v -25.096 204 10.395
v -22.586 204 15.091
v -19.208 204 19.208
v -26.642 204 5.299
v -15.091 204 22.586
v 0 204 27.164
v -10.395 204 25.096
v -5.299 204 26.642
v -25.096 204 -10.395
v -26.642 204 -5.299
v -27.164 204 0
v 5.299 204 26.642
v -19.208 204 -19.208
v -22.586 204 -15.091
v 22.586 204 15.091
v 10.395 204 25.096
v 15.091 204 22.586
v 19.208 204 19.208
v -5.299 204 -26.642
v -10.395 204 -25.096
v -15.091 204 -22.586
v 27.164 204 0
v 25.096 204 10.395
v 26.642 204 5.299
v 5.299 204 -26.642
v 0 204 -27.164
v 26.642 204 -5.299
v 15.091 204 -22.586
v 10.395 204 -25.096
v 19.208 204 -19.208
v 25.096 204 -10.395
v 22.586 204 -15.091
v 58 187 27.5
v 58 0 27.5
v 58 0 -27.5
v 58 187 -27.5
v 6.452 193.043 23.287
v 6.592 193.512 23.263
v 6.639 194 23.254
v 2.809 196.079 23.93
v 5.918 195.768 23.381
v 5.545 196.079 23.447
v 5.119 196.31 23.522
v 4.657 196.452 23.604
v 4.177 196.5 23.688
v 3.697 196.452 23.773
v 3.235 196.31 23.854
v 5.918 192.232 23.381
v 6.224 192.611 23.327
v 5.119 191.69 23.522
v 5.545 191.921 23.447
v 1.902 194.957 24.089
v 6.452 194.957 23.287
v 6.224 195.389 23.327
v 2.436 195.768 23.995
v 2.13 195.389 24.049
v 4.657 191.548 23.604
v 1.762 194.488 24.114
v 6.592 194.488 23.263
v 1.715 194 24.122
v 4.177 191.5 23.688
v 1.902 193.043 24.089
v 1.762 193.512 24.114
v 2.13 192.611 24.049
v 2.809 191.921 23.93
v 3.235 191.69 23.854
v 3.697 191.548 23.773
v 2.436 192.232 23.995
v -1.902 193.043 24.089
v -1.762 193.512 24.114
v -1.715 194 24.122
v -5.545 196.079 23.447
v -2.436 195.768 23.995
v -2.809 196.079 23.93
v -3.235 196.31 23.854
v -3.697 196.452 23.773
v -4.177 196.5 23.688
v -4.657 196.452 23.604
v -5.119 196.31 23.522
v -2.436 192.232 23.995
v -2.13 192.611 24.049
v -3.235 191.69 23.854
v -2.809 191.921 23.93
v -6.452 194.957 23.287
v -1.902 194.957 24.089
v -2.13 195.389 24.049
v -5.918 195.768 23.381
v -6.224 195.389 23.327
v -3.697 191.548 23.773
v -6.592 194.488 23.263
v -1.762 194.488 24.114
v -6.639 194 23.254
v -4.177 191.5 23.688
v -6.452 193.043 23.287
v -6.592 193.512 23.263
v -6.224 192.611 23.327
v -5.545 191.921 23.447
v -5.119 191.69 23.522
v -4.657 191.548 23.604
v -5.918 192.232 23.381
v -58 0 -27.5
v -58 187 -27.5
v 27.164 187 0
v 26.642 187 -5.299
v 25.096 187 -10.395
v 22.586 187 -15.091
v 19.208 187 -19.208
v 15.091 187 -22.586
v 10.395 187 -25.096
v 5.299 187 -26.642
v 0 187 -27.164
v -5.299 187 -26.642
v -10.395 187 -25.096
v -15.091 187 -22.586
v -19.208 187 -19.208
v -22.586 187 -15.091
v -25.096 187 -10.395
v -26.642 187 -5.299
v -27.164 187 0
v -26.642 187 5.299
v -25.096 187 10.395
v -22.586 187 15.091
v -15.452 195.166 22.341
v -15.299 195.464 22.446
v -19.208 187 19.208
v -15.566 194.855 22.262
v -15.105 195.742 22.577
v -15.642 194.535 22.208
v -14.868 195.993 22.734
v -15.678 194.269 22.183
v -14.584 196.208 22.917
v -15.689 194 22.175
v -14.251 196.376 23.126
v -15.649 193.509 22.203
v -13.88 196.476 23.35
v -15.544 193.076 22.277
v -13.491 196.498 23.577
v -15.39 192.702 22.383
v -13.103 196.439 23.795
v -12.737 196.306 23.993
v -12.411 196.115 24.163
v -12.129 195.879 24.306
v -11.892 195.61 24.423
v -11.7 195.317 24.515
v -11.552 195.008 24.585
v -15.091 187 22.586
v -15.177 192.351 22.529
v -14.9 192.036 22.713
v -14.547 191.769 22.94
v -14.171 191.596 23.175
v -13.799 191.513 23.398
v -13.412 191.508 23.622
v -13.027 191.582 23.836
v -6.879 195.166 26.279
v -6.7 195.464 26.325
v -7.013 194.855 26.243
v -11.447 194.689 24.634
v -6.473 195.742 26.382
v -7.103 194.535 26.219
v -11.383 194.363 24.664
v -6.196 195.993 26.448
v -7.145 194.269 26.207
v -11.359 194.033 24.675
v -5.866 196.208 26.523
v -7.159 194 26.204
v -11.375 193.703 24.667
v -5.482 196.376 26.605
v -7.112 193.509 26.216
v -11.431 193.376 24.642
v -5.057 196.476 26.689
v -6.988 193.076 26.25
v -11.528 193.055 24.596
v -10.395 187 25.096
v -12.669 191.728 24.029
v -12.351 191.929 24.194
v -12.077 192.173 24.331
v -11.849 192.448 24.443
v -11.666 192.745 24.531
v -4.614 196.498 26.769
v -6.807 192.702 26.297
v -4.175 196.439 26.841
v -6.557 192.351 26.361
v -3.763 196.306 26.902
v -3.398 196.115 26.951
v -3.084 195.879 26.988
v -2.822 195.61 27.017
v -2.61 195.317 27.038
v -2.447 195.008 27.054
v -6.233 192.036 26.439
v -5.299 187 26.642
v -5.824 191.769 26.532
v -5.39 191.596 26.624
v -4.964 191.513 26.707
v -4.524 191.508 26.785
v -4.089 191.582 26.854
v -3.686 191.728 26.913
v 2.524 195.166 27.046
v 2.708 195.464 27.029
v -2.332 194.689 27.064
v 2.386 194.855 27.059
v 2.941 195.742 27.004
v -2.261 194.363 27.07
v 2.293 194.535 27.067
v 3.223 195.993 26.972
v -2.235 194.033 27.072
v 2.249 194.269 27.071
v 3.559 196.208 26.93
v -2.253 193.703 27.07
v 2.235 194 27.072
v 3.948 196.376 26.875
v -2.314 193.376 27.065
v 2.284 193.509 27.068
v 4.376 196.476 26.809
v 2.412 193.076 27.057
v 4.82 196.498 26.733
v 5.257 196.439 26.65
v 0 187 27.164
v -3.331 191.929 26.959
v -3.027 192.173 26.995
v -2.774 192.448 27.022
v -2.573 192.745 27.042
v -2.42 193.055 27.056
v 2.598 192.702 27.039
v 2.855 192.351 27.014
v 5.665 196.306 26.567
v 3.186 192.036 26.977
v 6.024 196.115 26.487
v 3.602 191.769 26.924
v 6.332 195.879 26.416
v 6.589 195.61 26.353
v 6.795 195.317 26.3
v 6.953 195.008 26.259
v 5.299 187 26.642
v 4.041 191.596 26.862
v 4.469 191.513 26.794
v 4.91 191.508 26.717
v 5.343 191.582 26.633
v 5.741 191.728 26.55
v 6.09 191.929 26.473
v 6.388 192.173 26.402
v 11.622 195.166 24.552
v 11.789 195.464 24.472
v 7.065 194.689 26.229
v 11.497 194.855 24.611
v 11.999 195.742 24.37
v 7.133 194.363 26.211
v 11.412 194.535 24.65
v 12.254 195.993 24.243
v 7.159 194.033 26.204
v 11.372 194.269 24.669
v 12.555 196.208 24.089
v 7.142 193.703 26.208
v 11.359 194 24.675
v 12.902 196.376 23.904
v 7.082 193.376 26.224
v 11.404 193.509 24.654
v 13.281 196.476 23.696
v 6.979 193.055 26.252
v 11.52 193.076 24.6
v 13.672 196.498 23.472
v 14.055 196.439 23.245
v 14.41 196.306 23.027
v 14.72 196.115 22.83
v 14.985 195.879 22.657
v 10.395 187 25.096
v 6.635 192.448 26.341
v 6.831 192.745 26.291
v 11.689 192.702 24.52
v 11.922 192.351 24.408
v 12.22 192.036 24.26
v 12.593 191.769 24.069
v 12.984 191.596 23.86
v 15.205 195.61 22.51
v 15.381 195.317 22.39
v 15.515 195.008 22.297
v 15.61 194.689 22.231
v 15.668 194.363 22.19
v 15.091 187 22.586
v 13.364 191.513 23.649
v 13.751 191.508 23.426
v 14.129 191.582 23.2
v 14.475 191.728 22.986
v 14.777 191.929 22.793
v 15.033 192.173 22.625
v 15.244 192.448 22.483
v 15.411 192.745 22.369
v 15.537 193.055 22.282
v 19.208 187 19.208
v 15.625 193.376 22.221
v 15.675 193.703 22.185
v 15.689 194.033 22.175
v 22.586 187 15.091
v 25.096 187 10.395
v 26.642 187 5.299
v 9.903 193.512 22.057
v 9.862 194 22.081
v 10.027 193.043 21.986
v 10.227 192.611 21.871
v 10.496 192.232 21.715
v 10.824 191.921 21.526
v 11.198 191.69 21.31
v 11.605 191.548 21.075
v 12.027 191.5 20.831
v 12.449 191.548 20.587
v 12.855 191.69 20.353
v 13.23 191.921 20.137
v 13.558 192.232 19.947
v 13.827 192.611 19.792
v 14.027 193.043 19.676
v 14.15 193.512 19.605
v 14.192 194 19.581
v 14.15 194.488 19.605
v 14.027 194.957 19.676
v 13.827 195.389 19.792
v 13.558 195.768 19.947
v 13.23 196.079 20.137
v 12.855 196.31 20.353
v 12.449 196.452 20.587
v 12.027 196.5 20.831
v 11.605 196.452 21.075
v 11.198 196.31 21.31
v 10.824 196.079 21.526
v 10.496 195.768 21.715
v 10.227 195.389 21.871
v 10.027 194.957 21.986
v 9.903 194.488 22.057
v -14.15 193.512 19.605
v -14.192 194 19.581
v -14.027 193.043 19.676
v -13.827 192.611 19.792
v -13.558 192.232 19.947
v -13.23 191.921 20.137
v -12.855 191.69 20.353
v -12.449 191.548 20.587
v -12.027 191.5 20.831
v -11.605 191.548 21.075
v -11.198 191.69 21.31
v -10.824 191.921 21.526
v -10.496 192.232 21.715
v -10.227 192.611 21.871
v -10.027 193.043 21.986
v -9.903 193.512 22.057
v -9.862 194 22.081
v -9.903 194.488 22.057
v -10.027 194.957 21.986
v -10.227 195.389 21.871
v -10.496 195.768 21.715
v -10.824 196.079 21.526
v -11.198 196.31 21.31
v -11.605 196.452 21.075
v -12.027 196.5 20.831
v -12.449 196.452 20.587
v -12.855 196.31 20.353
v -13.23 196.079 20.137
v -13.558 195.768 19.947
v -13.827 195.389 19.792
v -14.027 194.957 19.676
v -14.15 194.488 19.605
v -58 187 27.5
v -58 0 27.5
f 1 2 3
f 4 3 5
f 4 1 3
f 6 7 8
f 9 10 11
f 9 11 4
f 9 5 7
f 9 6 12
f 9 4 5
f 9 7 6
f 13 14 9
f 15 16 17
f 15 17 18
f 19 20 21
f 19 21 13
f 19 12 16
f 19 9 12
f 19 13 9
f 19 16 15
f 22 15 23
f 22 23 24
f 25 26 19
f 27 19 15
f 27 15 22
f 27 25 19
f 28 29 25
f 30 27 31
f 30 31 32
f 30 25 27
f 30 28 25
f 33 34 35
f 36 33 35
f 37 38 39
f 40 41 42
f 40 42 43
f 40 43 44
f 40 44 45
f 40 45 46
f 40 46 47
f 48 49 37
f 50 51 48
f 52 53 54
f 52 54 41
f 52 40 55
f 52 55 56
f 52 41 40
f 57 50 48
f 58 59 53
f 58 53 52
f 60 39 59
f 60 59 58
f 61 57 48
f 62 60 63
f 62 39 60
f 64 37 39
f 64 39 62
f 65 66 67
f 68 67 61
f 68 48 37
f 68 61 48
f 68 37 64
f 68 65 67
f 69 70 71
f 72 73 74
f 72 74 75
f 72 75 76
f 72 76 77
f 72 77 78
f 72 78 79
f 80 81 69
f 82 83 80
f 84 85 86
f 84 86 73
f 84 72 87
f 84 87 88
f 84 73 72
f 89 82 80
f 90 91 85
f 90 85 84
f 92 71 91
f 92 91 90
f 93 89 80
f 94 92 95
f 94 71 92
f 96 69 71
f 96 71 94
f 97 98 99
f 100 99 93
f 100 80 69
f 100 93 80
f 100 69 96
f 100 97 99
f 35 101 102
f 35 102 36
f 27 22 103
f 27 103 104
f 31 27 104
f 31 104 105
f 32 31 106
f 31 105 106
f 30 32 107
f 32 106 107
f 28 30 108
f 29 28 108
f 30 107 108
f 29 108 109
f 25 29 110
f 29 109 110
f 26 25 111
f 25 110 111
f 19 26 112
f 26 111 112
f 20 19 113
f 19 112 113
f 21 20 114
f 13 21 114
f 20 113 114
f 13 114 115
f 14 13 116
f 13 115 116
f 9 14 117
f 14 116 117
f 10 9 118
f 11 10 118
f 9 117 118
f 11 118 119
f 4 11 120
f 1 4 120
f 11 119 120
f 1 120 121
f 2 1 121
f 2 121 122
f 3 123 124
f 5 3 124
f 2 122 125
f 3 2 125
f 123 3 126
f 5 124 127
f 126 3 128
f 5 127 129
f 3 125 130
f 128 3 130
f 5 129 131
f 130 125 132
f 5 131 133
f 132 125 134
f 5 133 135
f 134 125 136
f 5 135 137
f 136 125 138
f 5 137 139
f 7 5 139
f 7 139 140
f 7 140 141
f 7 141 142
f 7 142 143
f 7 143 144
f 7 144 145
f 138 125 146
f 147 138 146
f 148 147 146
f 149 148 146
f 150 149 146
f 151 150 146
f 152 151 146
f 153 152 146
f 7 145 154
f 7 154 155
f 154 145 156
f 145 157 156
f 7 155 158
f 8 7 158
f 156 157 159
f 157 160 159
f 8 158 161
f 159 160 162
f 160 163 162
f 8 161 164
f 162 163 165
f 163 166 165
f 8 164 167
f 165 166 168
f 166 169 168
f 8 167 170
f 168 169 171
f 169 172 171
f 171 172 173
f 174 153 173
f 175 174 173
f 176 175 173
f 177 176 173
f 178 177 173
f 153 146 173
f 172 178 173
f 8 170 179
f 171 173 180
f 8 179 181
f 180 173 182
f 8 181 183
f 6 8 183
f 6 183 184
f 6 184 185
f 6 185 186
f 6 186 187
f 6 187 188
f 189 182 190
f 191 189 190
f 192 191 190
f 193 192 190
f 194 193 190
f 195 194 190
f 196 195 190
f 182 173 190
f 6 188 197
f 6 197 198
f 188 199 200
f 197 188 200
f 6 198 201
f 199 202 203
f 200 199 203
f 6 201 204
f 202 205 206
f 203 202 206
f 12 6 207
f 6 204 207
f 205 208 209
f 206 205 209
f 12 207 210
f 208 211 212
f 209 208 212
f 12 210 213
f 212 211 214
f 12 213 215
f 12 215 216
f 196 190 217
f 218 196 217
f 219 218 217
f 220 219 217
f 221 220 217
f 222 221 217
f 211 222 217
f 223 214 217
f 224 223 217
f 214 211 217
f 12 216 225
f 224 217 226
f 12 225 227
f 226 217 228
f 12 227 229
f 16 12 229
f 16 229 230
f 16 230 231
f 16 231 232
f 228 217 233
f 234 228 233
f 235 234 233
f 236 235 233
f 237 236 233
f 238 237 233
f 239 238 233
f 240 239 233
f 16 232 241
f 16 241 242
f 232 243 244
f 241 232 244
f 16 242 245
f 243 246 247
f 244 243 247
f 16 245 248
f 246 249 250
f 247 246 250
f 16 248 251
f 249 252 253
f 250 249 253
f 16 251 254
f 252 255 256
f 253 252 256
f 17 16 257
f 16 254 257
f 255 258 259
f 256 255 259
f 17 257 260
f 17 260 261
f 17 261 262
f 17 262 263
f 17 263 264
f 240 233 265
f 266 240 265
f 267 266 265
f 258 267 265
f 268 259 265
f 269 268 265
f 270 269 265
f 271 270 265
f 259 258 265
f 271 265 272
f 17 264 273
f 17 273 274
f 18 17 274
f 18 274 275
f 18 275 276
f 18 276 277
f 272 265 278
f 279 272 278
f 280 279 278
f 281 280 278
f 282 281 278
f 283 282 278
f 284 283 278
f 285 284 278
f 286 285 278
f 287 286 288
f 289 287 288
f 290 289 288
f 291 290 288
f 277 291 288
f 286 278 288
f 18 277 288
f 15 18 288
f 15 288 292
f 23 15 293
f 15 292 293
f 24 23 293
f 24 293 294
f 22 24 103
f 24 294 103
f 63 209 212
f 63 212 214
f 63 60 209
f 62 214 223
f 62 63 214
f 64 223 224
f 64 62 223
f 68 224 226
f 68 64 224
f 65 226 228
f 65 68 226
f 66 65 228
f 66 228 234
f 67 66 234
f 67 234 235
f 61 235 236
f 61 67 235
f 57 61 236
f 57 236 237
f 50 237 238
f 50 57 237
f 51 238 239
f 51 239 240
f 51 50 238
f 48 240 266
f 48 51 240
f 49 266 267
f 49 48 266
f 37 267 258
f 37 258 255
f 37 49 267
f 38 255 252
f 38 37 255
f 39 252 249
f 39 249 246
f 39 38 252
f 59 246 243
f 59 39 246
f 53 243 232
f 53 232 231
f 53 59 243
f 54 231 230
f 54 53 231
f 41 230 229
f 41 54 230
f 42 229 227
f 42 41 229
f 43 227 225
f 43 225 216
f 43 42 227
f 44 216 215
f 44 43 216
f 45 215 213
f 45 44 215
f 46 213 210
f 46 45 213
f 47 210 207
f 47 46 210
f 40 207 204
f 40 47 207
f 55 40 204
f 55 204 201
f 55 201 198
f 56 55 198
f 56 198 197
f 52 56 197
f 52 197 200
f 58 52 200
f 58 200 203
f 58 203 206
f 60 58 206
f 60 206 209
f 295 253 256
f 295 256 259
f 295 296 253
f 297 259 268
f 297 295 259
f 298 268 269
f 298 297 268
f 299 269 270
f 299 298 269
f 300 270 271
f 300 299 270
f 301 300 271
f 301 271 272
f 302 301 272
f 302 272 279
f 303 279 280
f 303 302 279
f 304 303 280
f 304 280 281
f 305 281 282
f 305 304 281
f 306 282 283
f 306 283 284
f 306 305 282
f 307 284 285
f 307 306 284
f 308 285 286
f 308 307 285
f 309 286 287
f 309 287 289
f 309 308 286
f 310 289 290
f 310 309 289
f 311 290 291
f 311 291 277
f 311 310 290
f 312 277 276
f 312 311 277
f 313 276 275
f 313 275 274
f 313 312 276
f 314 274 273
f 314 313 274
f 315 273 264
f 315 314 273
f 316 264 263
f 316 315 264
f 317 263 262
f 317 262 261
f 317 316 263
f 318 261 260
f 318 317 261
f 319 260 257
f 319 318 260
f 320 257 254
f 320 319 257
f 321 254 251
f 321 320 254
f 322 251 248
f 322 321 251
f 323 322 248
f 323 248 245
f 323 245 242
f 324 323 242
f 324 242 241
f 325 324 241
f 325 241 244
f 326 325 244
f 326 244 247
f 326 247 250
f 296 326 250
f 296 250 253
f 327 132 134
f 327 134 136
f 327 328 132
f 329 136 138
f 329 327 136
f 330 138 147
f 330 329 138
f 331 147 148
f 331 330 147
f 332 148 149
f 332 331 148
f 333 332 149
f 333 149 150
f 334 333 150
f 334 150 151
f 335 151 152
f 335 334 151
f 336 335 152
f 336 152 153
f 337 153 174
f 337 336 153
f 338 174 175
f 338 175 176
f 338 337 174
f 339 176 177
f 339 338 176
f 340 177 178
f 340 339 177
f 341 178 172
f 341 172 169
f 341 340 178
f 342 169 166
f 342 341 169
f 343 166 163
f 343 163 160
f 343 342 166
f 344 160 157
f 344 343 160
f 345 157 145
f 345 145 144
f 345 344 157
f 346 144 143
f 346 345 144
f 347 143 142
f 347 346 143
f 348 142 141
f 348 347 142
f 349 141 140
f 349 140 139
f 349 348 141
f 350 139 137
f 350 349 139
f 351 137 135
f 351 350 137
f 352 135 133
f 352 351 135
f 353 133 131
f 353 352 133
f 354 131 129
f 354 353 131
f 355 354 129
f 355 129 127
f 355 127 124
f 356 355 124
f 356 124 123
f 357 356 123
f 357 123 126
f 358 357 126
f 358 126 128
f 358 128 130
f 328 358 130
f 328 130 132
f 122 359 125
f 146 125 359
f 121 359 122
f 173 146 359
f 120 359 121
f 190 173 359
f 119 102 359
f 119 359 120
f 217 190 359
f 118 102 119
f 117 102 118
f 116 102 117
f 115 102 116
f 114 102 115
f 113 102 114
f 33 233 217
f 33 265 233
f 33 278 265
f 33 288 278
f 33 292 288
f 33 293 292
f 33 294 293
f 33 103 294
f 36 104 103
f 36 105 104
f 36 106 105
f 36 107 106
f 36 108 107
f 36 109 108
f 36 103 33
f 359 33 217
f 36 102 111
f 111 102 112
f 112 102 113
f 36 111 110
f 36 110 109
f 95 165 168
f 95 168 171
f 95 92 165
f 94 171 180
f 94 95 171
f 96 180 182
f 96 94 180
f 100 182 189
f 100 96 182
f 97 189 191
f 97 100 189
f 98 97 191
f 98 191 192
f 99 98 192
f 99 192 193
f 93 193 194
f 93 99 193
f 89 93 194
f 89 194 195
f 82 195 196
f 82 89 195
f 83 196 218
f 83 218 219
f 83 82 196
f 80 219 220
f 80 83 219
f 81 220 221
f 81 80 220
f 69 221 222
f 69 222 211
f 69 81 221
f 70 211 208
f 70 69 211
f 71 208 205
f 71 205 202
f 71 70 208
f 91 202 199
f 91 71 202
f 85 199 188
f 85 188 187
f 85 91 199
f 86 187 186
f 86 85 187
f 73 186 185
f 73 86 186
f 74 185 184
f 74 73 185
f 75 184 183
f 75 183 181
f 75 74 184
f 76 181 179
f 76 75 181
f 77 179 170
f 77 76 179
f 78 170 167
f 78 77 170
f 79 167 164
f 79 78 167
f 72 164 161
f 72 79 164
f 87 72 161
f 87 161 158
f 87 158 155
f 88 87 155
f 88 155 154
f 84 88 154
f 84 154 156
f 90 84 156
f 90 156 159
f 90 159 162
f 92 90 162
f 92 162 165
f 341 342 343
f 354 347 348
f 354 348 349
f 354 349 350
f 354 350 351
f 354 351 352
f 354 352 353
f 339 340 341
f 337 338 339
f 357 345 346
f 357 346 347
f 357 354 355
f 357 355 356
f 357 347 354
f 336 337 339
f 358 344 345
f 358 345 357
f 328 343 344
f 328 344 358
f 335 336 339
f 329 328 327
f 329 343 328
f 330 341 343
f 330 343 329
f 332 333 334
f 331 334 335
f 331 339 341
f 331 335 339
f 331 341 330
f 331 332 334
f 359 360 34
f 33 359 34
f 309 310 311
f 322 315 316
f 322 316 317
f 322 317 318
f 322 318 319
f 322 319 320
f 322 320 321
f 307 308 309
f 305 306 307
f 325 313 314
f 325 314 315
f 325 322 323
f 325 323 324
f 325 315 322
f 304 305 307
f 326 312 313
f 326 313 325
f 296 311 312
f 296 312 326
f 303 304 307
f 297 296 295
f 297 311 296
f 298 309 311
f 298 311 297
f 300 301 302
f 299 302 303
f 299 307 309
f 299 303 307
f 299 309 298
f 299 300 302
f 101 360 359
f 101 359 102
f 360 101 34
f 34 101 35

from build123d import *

# Parameters (mm, degrees)
SKETCH1_W           = 116
SKETCH1_H           = 55
BOSS_EXTRUDE1_DEPTH = 187
SKETCH2_R           = 27.163974649
BOSS_EXTRUDE2_DEPTH = 17
CIRPATTERN1_COUNT   = 4
CIRPATTERN1_ANGLE   = 60


with BuildPart() as part:
    # Sketch1 → Boss-Extrude1 (new body)
    with BuildSketch(Plane(origin=(0, 0, 0), x_dir=(1, 0, 0), z_dir=(0, 1, 0))):
        Rectangle(SKETCH1_W, SKETCH1_H)
    extrude(amount=BOSS_EXTRUDE1_DEPTH)

    # Sketch2 → Boss-Extrude2 (add)
    with BuildSketch(Plane(origin=(0, 187, 0), x_dir=(1, 0, 0), z_dir=(0, 1, 0))):
        Circle(SKETCH2_R)
    extrude(amount=BOSS_EXTRUDE2_DEPTH)

    # Sketch4 → Cut-Revolve1 (revolve, cut)
    with BuildSketch(Plane(origin=(0, 194, 0), x_dir=(-1, 0, 0), z_dir=(0, 1, 0))):
        Polygon((-14.582777308, 25.258111213), (-12.417713798, 26.508111213), (-9.861835709, 22.081200504), (-12.026899219, 20.831200504), align=None)
    cut_revolve1 = revolve(axis=Axis((0, 194, 0), (0.5, 0, 0.866025404)), mode=Mode.SUBTRACT)

    # CirPattern1: Cut-Revolve1 ×4 about axis
    cirpattern1_axis = Axis((0, 0, 0), (0, -1, 0))
    for i in range(1, CIRPATTERN1_COUNT):
        add(cut_revolve1.rotate(cirpattern1_axis, i * CIRPATTERN1_ANGLE / (CIRPATTERN1_COUNT - 1)), mode=Mode.SUBTRACT)


solid = part.part
